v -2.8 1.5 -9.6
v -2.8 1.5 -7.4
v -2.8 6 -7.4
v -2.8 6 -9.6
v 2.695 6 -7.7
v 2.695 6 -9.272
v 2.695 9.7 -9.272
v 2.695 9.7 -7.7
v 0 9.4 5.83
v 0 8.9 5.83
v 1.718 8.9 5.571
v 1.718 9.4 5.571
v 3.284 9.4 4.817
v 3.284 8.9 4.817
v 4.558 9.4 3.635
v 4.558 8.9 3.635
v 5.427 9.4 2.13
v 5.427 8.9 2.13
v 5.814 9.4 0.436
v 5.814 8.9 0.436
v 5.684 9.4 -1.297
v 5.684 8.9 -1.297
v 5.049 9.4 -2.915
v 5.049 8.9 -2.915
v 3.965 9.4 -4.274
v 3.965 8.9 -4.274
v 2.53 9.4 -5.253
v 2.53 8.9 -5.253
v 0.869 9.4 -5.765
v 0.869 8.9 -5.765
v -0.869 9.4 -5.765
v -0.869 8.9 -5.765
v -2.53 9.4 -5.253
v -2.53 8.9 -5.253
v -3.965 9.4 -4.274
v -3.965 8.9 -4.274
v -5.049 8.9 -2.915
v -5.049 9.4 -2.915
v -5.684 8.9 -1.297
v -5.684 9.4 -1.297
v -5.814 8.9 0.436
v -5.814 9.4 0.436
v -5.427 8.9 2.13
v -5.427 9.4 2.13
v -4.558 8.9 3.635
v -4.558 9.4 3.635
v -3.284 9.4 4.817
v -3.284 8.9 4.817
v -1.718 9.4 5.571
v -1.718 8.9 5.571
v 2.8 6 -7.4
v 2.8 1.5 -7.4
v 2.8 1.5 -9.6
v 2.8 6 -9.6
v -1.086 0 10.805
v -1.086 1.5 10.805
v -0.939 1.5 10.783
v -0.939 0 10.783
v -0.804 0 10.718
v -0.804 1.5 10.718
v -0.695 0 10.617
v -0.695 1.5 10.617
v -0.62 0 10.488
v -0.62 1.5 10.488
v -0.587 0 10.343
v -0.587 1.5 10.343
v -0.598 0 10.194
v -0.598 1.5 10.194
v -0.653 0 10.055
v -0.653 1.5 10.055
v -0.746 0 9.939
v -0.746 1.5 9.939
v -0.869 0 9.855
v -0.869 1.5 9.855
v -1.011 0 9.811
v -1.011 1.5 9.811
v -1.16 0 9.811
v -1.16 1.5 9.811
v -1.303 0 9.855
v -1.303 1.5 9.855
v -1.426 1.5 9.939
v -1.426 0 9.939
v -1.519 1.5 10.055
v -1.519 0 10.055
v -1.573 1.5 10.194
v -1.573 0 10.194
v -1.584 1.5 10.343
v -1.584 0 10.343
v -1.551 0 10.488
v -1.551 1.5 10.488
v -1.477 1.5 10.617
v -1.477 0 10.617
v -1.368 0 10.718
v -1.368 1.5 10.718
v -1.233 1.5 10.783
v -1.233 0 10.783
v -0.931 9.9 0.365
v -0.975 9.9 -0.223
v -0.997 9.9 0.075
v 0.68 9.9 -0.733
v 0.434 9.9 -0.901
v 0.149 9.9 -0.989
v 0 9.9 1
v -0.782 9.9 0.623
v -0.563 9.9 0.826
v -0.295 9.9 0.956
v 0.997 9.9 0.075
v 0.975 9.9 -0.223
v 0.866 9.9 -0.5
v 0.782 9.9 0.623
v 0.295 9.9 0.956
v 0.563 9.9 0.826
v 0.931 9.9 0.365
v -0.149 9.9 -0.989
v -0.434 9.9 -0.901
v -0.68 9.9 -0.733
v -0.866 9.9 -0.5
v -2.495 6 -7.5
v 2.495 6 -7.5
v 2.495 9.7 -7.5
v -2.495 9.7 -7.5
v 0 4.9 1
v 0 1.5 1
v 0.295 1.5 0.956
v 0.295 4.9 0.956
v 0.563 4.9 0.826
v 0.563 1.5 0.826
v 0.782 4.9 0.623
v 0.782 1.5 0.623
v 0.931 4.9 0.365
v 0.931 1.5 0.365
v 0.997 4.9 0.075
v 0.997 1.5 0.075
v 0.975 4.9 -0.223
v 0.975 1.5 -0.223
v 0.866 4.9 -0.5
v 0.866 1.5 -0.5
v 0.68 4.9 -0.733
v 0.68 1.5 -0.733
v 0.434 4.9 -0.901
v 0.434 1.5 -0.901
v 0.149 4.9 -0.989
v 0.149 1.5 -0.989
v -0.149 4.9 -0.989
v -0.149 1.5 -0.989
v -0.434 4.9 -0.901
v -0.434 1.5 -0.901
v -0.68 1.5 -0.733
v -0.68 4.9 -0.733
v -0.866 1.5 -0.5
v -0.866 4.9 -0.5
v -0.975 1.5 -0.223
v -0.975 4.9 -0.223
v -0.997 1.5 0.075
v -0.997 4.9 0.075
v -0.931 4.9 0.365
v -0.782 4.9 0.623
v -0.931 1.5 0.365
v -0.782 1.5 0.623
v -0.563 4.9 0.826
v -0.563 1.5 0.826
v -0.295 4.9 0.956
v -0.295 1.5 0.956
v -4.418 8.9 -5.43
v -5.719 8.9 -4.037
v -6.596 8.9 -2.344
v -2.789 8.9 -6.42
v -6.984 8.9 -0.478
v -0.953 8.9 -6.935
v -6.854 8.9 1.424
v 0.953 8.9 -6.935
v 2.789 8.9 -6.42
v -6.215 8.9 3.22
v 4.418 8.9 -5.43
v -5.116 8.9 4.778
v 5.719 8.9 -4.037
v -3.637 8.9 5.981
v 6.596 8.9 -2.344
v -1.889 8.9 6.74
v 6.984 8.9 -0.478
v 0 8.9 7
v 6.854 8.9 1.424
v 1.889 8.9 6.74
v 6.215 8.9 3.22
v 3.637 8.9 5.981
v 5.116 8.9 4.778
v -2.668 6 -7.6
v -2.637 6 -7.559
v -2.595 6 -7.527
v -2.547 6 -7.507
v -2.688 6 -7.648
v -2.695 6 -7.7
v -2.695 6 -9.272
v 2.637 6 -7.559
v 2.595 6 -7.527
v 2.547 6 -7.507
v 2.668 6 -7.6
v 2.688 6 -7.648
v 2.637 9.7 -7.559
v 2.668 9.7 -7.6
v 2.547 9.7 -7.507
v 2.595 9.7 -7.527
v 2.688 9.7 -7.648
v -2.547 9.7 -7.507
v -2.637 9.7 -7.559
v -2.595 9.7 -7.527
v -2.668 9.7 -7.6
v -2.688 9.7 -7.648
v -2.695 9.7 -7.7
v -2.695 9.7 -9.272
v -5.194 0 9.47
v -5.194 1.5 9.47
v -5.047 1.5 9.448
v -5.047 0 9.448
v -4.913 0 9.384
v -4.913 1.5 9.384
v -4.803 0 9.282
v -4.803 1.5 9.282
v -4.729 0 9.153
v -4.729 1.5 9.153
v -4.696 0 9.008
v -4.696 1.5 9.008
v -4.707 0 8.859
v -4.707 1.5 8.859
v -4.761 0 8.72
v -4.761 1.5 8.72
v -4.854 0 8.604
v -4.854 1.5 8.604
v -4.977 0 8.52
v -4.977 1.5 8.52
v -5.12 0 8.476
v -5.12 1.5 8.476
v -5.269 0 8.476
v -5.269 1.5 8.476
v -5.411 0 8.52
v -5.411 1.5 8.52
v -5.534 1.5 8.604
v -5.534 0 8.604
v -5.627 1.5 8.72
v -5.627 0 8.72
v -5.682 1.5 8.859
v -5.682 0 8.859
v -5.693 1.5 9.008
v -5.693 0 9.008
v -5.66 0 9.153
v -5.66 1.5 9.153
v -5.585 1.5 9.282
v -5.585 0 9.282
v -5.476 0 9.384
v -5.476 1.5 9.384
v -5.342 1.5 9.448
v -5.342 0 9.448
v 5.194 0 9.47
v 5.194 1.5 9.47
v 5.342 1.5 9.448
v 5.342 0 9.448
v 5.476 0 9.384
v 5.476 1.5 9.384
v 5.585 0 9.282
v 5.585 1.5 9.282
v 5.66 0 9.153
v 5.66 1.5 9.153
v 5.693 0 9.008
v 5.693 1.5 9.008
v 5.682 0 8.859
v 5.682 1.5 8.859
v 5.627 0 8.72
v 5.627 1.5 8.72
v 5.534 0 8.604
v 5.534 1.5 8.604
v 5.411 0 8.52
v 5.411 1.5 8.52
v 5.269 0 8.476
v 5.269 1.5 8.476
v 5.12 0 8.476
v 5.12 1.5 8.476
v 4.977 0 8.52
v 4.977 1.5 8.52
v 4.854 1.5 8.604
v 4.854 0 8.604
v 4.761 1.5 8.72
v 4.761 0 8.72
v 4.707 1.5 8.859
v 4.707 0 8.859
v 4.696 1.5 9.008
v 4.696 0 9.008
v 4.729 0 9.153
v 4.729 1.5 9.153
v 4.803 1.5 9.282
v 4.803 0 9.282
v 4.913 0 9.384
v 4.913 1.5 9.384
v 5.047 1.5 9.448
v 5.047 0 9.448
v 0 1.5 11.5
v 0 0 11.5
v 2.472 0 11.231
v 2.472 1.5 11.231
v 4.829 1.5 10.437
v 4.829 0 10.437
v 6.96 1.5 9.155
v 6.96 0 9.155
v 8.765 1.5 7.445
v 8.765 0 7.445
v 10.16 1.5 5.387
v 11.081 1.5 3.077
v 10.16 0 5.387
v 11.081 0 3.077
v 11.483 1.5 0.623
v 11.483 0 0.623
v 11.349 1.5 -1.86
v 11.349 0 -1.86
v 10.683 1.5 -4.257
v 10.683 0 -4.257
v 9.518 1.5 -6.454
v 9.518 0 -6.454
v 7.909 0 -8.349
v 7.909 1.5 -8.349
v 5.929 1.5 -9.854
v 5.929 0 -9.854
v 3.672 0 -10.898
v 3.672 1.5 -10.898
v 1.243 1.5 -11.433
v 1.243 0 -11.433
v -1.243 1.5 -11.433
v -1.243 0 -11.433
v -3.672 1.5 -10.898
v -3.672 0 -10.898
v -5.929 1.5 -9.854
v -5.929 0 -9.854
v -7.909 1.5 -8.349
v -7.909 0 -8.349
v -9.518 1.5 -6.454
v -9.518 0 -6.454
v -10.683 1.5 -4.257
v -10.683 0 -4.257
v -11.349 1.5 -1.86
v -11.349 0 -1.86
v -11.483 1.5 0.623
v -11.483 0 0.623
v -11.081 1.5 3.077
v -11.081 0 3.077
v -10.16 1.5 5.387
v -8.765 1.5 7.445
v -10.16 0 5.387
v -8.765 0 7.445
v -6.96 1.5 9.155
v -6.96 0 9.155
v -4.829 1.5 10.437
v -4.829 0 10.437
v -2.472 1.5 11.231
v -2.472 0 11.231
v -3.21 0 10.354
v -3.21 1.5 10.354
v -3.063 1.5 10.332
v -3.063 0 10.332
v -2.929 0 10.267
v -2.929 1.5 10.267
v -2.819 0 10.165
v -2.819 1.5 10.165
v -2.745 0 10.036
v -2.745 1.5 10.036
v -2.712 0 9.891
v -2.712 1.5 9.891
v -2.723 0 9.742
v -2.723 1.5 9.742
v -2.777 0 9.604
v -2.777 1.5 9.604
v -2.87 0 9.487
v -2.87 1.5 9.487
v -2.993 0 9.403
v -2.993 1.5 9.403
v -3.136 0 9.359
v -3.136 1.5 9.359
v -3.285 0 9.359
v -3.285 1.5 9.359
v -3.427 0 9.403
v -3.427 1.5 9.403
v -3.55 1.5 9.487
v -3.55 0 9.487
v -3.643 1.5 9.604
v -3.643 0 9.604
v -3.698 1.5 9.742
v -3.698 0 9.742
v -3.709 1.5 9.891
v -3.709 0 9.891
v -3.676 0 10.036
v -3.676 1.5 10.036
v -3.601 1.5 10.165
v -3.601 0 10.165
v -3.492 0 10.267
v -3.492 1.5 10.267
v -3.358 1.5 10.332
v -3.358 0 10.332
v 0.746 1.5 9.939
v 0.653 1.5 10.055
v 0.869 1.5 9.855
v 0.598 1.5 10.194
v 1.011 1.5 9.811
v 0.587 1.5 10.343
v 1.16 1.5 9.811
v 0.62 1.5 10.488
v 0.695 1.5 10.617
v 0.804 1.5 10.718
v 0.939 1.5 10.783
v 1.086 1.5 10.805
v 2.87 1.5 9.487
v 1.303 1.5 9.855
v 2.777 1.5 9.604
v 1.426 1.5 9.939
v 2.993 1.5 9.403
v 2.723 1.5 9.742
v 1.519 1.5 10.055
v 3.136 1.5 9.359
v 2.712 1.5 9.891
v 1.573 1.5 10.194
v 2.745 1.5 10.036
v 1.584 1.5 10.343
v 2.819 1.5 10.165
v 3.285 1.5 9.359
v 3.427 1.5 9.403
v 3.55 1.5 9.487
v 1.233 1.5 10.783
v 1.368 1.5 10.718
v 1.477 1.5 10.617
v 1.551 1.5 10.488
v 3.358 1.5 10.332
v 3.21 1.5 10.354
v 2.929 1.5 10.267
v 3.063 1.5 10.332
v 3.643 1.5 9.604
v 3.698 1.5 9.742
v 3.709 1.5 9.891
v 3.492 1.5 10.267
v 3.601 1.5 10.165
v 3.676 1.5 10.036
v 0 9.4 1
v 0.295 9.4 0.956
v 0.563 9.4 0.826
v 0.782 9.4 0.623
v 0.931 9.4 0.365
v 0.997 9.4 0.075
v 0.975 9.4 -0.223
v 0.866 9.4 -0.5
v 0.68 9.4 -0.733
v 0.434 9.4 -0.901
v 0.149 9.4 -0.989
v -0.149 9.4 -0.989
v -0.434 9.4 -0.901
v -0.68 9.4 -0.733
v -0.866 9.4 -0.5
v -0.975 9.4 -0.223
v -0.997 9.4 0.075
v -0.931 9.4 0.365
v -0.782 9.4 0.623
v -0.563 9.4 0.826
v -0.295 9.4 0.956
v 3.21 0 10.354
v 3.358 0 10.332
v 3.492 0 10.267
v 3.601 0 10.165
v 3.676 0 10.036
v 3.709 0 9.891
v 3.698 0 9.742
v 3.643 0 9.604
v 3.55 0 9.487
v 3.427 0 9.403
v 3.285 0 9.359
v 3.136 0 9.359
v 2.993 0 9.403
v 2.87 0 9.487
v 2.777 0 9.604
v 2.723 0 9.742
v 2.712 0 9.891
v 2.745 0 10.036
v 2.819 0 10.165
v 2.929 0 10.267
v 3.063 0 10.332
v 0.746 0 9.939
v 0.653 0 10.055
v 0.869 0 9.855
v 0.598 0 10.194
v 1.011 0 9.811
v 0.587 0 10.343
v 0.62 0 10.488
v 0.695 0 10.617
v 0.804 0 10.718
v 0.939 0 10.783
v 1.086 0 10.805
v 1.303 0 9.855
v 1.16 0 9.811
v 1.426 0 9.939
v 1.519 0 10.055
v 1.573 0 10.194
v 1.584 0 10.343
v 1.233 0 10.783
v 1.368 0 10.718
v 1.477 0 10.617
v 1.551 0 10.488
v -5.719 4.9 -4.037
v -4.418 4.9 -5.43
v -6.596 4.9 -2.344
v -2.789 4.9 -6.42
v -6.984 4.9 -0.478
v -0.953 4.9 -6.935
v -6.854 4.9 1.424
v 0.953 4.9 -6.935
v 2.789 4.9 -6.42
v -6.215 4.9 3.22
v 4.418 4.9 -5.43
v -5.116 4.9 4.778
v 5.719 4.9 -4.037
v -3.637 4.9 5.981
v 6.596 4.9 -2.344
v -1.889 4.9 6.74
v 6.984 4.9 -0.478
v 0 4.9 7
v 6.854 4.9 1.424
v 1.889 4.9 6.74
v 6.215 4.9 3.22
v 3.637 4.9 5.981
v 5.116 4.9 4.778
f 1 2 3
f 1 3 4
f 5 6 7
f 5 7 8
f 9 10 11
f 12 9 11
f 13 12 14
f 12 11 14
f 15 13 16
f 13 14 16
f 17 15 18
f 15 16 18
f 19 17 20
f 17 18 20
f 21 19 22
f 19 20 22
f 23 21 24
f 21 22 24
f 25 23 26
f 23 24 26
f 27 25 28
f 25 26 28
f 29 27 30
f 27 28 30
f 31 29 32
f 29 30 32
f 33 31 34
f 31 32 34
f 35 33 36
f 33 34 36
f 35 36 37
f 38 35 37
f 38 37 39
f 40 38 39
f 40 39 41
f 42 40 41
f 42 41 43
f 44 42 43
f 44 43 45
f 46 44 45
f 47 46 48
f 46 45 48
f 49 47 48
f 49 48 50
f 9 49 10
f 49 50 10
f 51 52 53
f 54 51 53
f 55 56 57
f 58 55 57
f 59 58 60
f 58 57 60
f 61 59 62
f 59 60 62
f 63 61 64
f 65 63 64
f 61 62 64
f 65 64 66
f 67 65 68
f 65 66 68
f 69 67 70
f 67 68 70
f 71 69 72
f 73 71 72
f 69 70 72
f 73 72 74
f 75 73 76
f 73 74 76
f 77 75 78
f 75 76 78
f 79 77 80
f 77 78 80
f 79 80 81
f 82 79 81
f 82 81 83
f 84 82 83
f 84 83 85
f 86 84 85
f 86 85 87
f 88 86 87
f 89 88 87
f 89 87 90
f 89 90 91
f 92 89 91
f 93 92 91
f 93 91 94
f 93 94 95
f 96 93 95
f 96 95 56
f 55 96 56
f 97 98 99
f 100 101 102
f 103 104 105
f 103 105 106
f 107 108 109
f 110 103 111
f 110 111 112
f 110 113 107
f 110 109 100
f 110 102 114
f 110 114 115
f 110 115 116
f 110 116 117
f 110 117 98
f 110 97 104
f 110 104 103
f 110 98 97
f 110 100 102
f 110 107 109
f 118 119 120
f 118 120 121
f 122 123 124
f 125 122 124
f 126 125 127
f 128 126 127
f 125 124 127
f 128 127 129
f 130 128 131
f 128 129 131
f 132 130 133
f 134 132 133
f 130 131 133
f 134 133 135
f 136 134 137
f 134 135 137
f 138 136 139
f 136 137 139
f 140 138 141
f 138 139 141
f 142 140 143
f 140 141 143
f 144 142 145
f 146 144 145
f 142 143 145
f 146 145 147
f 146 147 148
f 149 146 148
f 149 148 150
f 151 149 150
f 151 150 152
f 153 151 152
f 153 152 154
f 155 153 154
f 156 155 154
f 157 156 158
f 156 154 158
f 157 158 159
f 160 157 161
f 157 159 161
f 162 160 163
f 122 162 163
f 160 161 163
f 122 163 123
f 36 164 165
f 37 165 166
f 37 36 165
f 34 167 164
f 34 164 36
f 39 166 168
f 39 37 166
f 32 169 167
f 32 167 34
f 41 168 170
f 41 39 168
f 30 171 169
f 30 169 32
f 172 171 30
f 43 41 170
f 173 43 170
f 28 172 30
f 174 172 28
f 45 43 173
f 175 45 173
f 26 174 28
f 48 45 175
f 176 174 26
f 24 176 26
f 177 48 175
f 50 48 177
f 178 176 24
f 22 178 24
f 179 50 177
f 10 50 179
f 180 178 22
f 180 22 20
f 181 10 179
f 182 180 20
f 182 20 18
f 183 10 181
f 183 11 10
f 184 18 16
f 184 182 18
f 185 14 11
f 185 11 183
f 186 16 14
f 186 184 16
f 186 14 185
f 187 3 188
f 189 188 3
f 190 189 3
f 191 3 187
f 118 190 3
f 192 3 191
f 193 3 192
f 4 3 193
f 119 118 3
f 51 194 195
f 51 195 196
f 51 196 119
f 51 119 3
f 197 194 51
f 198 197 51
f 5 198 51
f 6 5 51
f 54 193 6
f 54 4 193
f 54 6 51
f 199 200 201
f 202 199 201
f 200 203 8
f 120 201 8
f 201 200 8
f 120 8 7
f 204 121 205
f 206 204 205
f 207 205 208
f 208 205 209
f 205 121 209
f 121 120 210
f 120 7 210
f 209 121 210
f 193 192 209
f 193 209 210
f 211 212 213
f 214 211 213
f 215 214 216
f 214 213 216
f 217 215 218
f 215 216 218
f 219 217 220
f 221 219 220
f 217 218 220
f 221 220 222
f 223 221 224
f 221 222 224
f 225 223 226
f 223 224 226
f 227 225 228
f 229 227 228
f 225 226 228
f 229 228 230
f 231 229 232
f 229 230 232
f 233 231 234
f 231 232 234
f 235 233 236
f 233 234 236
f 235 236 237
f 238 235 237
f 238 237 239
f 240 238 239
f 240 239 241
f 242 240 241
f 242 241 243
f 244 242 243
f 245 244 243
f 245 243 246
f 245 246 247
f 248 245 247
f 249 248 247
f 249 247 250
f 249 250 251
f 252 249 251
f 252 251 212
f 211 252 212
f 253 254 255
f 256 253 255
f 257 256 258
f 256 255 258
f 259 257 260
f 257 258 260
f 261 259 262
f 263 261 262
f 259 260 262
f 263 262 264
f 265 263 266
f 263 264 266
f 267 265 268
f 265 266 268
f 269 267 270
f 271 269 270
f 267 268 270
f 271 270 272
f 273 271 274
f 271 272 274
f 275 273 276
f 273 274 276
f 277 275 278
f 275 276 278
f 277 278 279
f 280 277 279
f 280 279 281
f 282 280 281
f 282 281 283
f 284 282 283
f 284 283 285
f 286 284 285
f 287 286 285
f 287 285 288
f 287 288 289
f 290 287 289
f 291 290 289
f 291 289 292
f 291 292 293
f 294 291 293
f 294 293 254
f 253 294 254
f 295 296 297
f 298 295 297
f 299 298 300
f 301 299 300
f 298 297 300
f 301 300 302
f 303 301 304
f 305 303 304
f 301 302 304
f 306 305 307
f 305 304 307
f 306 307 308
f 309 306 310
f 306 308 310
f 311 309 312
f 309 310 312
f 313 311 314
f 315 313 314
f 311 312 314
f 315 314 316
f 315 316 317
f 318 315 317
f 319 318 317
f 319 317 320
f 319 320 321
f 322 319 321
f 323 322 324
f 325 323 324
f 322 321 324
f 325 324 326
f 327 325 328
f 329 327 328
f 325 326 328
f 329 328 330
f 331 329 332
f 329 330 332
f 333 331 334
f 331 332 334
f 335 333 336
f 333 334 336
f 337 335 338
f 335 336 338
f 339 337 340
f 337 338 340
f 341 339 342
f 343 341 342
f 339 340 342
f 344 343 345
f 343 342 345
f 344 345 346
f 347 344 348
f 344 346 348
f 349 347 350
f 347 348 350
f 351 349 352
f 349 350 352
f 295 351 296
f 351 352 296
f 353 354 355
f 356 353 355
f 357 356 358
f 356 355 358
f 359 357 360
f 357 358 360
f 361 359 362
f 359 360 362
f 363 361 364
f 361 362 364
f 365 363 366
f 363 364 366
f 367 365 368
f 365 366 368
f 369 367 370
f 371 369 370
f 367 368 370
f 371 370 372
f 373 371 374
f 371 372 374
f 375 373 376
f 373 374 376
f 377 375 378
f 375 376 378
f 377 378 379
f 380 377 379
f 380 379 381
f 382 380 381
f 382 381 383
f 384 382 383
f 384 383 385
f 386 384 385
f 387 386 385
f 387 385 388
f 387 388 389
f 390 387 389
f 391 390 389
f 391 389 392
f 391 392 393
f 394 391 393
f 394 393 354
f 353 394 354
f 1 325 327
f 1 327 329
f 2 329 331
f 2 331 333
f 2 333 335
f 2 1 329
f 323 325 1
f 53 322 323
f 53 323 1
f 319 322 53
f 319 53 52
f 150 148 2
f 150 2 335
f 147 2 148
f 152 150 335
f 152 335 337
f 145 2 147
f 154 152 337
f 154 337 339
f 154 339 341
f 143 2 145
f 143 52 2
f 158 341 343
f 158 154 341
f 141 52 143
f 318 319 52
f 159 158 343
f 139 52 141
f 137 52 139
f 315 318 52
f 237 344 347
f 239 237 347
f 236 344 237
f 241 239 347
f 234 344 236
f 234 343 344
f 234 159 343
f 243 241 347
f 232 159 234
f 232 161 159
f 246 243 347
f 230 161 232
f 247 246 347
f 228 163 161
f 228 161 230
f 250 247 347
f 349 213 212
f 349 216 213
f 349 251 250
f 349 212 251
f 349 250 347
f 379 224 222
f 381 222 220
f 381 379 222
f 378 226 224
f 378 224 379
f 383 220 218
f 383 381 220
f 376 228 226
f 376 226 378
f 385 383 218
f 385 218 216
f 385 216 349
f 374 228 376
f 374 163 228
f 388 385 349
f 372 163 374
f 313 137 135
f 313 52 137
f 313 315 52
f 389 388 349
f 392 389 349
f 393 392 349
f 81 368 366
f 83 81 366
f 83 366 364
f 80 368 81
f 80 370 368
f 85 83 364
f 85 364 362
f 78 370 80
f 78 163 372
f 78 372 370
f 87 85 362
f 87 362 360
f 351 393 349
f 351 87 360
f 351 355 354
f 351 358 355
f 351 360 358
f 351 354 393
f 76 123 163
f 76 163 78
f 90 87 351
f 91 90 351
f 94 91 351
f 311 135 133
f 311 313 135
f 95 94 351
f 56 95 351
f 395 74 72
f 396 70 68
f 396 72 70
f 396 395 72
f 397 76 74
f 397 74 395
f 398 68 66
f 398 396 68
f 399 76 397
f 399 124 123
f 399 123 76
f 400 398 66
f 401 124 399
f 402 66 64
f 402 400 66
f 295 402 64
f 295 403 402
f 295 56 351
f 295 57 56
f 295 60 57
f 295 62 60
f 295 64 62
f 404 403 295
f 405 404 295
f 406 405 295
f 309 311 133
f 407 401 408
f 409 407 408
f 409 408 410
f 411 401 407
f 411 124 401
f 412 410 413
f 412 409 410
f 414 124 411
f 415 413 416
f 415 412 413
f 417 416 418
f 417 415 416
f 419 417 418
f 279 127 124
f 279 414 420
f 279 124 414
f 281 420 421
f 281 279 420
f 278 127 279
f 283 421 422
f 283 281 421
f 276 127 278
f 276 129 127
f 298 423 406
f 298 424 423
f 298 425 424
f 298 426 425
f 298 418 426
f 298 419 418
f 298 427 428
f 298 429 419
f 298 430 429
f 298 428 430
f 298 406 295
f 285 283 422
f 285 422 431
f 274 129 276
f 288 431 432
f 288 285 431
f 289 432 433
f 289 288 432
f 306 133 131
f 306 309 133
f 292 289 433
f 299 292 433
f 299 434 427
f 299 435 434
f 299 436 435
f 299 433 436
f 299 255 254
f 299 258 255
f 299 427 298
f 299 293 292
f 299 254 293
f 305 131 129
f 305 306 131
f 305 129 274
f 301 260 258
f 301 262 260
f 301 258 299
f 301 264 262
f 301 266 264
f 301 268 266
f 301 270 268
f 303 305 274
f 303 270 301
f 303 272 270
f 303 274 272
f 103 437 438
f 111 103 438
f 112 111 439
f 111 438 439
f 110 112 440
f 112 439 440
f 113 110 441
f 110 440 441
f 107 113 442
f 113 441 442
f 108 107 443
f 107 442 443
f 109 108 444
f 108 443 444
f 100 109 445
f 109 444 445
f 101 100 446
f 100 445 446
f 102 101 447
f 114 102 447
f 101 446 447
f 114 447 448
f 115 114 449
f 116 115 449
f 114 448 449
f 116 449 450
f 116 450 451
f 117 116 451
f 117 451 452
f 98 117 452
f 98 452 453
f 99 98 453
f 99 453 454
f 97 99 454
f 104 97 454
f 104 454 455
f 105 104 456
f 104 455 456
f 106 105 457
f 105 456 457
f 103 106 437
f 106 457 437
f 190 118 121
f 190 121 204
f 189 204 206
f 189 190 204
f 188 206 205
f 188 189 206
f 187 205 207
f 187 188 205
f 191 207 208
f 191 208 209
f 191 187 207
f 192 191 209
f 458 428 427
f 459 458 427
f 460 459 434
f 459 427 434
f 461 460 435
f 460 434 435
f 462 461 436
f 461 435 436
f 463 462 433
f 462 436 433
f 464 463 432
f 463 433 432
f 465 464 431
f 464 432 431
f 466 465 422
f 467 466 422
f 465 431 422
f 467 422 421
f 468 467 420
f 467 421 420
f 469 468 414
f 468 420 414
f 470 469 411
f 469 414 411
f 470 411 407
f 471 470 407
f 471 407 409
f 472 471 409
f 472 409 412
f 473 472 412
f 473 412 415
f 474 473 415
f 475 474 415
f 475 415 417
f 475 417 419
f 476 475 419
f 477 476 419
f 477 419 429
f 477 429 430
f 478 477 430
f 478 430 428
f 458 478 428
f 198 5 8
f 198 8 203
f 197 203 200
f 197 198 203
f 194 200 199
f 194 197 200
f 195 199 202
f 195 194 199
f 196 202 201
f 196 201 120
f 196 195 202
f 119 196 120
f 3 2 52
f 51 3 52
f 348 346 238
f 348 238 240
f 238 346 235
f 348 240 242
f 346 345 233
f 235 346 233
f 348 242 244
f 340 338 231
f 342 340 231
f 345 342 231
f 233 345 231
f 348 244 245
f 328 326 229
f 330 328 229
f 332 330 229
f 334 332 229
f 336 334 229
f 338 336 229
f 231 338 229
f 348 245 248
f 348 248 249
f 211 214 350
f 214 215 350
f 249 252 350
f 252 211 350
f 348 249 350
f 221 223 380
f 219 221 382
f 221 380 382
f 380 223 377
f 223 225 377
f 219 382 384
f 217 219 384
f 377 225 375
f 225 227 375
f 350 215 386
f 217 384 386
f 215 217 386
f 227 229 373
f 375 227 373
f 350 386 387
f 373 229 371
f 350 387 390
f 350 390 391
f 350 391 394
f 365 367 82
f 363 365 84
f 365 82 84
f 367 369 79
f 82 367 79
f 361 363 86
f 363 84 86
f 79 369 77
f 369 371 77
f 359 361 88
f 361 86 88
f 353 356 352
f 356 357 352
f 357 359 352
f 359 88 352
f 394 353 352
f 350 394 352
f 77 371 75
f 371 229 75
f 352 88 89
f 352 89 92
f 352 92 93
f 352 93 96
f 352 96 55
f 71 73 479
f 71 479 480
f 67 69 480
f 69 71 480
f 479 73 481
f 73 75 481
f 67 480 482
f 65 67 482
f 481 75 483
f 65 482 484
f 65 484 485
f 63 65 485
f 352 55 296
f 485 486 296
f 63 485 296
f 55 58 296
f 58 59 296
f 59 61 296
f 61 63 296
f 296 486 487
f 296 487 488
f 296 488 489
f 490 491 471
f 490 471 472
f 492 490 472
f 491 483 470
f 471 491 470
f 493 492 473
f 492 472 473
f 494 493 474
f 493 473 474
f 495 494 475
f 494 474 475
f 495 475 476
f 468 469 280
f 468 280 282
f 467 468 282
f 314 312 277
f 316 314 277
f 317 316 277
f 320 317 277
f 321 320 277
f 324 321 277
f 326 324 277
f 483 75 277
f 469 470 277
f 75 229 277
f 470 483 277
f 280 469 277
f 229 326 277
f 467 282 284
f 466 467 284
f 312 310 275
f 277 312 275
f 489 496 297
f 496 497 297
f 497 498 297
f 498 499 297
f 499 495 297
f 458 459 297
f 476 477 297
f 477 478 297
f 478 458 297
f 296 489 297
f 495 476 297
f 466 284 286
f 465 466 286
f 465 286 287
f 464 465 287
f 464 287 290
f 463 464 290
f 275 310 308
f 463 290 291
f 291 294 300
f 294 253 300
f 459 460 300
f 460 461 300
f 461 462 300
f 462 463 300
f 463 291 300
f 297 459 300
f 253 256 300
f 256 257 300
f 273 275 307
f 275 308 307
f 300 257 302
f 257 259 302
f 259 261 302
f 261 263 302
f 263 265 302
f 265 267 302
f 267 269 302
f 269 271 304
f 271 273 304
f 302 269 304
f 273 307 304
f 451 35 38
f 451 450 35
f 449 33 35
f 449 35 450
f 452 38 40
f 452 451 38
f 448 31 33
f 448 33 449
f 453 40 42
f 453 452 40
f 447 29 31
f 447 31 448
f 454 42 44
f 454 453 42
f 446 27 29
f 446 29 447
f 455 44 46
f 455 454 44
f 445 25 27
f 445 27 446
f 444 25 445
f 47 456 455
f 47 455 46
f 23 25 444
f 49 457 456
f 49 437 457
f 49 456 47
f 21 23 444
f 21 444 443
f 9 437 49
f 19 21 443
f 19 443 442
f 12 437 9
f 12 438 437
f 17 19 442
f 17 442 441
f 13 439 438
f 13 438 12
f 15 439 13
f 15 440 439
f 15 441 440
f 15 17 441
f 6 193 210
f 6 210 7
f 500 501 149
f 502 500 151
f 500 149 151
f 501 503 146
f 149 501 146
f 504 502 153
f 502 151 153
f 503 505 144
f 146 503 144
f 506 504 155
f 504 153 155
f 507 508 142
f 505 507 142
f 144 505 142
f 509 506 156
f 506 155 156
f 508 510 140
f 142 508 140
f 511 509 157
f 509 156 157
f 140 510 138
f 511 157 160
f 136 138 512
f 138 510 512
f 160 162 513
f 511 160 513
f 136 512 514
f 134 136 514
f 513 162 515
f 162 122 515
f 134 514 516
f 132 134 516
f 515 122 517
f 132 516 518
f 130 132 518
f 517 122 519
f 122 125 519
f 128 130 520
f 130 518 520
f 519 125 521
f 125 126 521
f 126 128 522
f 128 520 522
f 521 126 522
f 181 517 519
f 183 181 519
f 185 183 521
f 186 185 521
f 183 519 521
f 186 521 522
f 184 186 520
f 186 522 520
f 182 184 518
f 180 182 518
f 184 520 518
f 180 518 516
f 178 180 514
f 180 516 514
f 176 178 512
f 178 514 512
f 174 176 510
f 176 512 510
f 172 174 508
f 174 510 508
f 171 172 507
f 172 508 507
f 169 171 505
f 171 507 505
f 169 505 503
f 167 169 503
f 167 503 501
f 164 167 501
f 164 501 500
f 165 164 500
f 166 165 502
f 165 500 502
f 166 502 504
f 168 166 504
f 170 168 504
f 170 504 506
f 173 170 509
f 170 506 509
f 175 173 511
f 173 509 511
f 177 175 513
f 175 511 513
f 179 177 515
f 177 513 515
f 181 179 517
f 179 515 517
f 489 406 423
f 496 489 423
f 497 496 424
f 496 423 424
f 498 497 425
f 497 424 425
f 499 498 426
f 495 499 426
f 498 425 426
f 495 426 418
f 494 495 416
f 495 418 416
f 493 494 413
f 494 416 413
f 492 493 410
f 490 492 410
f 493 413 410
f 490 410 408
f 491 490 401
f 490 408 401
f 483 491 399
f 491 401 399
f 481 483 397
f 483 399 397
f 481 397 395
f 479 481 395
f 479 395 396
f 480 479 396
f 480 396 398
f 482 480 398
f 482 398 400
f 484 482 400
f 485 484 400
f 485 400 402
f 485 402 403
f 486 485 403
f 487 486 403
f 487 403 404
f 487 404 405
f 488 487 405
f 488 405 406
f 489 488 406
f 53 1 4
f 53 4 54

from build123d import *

# Parameters (mm, degrees)
ESBO_O1_R                = 11.5
RESSALTO_EXTRUS_O1_DEPTH = 1.5
ESBO_O2_W                = 5.6
ESBO_O2_H                = 2.2
RESSALTO_EXTRUS_O2_DEPTH = 4.5
RESSALTO_EXTRUS_O3_DEPTH = 3.7
ESBO_O4_R                = 1
RESSALTO_EXTRUS_O4_DEPTH = 3.4
ESBO_O5_R                = 7
RESSALTO_EXTRUS_O5_DEPTH = 4
ESBO_O6_R                = 5.830002148
RESSALTO_EXTRUS_O6_DEPTH = 0.5
ESBO_O7_R                = 1
RESSALTO_EXTRUS_O7_DEPTH = 0.5
ESBO_O8_R                = 0.5
CORTE_EXTRUS_O1_DEPTH    = 19.304644219


with BuildPart() as part:
    # Esboço1 → Ressalto-extrusão1 (new body)
    with BuildSketch(Plane(origin=(0, 0, 0), x_dir=(1, 0, 0), z_dir=(0, 1, 0))):
        with Locations(Location((0, 0, 0), (0, 0, 270))):
            Circle(ESBO_O1_R)
    extrude(amount=RESSALTO_EXTRUS_O1_DEPTH)

    # Esboço2 → Ressalto-extrusão2 (add)
    with BuildSketch(Plane(origin=(0, 1.5, 0), x_dir=(1, 0, 0), z_dir=(0, 1, 0))):
        with Locations((0, 8.5)):
            Rectangle(ESBO_O2_W, ESBO_O2_H)
    extrude(amount=RESSALTO_EXTRUS_O2_DEPTH)

    # Esboço3 → Ressalto-extrusão3 (add)
    with BuildSketch(Plane(origin=(0, 6, 0), x_dir=(1, 0, 0), z_dir=(0, 1, 0))):
        with BuildLine():
            Line((-2.695146994, 9.271525864), (2.695146994, 9.271525864))
            Line((2.695146994, 9.271525864), (2.695146994, 7.7))
            ThreePointArc((2.695146994, 7.7), (2.63656835, 7.558578644), (2.495146994, 7.5))
            Line((2.495146994, 7.5), (-2.495146994, 7.5))
            ThreePointArc((-2.495146994, 7.5), (-2.63656835, 7.558578644), (-2.695146994, 7.7))
            Line((-2.695146994, 7.7), (-2.695146994, 9.271525864))
        make_face()
    extrude(amount=RESSALTO_EXTRUS_O3_DEPTH)

    # Esboço4 → Ressalto-extrusão4 (add)
    with BuildSketch(Plane(origin=(0, 1.5, 0), x_dir=(1, 0, 0), z_dir=(0, 1, 0))):
        with Locations(Location((0, 0, 0), (0, 0, 270))):
            Circle(ESBO_O4_R)
    extrude(amount=RESSALTO_EXTRUS_O4_DEPTH)

    # Esboço5 → Ressalto-extrusão5 (add)
    with BuildSketch(Plane(origin=(0, 4.9, 0), x_dir=(1, 0, 0), z_dir=(0, 1, 0))):
        with Locations(Location((0, 0, 0), (0, 0, 270))):
            Circle(ESBO_O5_R)
    extrude(amount=RESSALTO_EXTRUS_O5_DEPTH)

    # Esboço6 → Ressalto-extrusão6 (add)
    with BuildSketch(Plane(origin=(0, 8.9, 0), x_dir=(1, 0, 0), z_dir=(0, 1, 0))):
        with Locations(Location((0, 0, 0), (0, 0, 270))):
            Circle(ESBO_O6_R)
    extrude(amount=RESSALTO_EXTRUS_O6_DEPTH)

    # Esboço7 → Ressalto-extrusão7 (add)
    with BuildSketch(Plane(origin=(0, 9.4, 0), x_dir=(1, 0, 0), z_dir=(0, 1, 0))):
        with Locations(Location((0, 0, 0), (0, 0, 270))):
            Circle(ESBO_O7_R)
    extrude(amount=RESSALTO_EXTRUS_O7_DEPTH)

    # Esboço8 → Corte-extrusão1 (cut, through all)
    with BuildSketch(Plane(origin=(0, 1.5, 0), x_dir=(1, 0, 0), z_dir=(0, 1, 0))):
        with Locations(Location((5.194212024, -8.970404078, 0), (0, 0, 270))):
            Circle(ESBO_O8_R)
        with Locations(Location((3.210199576, -9.853743332, 0), (0, 0, 270))):
            Circle(ESBO_O8_R)
        with Locations(Location((1.085886001, -10.305280121, 0), (0, 0, 270))):
            Circle(ESBO_O8_R)
        with Locations(Location((-1.085886001, -10.305280121, 0), (0, 0, 270))):
            Circle(ESBO_O8_R)
        with Locations(Location((-3.210199576, -9.853743332, 0), (0, 0, 270))):
            Circle(ESBO_O8_R)
        with Locations(Location((-5.194212024, -8.970404078, 0), (0, 0, 270))):
            Circle(ESBO_O8_R)
    extrude(amount=-CORTE_EXTRUS_O1_DEPTH, mode=Mode.SUBTRACT)


solid = part.part
